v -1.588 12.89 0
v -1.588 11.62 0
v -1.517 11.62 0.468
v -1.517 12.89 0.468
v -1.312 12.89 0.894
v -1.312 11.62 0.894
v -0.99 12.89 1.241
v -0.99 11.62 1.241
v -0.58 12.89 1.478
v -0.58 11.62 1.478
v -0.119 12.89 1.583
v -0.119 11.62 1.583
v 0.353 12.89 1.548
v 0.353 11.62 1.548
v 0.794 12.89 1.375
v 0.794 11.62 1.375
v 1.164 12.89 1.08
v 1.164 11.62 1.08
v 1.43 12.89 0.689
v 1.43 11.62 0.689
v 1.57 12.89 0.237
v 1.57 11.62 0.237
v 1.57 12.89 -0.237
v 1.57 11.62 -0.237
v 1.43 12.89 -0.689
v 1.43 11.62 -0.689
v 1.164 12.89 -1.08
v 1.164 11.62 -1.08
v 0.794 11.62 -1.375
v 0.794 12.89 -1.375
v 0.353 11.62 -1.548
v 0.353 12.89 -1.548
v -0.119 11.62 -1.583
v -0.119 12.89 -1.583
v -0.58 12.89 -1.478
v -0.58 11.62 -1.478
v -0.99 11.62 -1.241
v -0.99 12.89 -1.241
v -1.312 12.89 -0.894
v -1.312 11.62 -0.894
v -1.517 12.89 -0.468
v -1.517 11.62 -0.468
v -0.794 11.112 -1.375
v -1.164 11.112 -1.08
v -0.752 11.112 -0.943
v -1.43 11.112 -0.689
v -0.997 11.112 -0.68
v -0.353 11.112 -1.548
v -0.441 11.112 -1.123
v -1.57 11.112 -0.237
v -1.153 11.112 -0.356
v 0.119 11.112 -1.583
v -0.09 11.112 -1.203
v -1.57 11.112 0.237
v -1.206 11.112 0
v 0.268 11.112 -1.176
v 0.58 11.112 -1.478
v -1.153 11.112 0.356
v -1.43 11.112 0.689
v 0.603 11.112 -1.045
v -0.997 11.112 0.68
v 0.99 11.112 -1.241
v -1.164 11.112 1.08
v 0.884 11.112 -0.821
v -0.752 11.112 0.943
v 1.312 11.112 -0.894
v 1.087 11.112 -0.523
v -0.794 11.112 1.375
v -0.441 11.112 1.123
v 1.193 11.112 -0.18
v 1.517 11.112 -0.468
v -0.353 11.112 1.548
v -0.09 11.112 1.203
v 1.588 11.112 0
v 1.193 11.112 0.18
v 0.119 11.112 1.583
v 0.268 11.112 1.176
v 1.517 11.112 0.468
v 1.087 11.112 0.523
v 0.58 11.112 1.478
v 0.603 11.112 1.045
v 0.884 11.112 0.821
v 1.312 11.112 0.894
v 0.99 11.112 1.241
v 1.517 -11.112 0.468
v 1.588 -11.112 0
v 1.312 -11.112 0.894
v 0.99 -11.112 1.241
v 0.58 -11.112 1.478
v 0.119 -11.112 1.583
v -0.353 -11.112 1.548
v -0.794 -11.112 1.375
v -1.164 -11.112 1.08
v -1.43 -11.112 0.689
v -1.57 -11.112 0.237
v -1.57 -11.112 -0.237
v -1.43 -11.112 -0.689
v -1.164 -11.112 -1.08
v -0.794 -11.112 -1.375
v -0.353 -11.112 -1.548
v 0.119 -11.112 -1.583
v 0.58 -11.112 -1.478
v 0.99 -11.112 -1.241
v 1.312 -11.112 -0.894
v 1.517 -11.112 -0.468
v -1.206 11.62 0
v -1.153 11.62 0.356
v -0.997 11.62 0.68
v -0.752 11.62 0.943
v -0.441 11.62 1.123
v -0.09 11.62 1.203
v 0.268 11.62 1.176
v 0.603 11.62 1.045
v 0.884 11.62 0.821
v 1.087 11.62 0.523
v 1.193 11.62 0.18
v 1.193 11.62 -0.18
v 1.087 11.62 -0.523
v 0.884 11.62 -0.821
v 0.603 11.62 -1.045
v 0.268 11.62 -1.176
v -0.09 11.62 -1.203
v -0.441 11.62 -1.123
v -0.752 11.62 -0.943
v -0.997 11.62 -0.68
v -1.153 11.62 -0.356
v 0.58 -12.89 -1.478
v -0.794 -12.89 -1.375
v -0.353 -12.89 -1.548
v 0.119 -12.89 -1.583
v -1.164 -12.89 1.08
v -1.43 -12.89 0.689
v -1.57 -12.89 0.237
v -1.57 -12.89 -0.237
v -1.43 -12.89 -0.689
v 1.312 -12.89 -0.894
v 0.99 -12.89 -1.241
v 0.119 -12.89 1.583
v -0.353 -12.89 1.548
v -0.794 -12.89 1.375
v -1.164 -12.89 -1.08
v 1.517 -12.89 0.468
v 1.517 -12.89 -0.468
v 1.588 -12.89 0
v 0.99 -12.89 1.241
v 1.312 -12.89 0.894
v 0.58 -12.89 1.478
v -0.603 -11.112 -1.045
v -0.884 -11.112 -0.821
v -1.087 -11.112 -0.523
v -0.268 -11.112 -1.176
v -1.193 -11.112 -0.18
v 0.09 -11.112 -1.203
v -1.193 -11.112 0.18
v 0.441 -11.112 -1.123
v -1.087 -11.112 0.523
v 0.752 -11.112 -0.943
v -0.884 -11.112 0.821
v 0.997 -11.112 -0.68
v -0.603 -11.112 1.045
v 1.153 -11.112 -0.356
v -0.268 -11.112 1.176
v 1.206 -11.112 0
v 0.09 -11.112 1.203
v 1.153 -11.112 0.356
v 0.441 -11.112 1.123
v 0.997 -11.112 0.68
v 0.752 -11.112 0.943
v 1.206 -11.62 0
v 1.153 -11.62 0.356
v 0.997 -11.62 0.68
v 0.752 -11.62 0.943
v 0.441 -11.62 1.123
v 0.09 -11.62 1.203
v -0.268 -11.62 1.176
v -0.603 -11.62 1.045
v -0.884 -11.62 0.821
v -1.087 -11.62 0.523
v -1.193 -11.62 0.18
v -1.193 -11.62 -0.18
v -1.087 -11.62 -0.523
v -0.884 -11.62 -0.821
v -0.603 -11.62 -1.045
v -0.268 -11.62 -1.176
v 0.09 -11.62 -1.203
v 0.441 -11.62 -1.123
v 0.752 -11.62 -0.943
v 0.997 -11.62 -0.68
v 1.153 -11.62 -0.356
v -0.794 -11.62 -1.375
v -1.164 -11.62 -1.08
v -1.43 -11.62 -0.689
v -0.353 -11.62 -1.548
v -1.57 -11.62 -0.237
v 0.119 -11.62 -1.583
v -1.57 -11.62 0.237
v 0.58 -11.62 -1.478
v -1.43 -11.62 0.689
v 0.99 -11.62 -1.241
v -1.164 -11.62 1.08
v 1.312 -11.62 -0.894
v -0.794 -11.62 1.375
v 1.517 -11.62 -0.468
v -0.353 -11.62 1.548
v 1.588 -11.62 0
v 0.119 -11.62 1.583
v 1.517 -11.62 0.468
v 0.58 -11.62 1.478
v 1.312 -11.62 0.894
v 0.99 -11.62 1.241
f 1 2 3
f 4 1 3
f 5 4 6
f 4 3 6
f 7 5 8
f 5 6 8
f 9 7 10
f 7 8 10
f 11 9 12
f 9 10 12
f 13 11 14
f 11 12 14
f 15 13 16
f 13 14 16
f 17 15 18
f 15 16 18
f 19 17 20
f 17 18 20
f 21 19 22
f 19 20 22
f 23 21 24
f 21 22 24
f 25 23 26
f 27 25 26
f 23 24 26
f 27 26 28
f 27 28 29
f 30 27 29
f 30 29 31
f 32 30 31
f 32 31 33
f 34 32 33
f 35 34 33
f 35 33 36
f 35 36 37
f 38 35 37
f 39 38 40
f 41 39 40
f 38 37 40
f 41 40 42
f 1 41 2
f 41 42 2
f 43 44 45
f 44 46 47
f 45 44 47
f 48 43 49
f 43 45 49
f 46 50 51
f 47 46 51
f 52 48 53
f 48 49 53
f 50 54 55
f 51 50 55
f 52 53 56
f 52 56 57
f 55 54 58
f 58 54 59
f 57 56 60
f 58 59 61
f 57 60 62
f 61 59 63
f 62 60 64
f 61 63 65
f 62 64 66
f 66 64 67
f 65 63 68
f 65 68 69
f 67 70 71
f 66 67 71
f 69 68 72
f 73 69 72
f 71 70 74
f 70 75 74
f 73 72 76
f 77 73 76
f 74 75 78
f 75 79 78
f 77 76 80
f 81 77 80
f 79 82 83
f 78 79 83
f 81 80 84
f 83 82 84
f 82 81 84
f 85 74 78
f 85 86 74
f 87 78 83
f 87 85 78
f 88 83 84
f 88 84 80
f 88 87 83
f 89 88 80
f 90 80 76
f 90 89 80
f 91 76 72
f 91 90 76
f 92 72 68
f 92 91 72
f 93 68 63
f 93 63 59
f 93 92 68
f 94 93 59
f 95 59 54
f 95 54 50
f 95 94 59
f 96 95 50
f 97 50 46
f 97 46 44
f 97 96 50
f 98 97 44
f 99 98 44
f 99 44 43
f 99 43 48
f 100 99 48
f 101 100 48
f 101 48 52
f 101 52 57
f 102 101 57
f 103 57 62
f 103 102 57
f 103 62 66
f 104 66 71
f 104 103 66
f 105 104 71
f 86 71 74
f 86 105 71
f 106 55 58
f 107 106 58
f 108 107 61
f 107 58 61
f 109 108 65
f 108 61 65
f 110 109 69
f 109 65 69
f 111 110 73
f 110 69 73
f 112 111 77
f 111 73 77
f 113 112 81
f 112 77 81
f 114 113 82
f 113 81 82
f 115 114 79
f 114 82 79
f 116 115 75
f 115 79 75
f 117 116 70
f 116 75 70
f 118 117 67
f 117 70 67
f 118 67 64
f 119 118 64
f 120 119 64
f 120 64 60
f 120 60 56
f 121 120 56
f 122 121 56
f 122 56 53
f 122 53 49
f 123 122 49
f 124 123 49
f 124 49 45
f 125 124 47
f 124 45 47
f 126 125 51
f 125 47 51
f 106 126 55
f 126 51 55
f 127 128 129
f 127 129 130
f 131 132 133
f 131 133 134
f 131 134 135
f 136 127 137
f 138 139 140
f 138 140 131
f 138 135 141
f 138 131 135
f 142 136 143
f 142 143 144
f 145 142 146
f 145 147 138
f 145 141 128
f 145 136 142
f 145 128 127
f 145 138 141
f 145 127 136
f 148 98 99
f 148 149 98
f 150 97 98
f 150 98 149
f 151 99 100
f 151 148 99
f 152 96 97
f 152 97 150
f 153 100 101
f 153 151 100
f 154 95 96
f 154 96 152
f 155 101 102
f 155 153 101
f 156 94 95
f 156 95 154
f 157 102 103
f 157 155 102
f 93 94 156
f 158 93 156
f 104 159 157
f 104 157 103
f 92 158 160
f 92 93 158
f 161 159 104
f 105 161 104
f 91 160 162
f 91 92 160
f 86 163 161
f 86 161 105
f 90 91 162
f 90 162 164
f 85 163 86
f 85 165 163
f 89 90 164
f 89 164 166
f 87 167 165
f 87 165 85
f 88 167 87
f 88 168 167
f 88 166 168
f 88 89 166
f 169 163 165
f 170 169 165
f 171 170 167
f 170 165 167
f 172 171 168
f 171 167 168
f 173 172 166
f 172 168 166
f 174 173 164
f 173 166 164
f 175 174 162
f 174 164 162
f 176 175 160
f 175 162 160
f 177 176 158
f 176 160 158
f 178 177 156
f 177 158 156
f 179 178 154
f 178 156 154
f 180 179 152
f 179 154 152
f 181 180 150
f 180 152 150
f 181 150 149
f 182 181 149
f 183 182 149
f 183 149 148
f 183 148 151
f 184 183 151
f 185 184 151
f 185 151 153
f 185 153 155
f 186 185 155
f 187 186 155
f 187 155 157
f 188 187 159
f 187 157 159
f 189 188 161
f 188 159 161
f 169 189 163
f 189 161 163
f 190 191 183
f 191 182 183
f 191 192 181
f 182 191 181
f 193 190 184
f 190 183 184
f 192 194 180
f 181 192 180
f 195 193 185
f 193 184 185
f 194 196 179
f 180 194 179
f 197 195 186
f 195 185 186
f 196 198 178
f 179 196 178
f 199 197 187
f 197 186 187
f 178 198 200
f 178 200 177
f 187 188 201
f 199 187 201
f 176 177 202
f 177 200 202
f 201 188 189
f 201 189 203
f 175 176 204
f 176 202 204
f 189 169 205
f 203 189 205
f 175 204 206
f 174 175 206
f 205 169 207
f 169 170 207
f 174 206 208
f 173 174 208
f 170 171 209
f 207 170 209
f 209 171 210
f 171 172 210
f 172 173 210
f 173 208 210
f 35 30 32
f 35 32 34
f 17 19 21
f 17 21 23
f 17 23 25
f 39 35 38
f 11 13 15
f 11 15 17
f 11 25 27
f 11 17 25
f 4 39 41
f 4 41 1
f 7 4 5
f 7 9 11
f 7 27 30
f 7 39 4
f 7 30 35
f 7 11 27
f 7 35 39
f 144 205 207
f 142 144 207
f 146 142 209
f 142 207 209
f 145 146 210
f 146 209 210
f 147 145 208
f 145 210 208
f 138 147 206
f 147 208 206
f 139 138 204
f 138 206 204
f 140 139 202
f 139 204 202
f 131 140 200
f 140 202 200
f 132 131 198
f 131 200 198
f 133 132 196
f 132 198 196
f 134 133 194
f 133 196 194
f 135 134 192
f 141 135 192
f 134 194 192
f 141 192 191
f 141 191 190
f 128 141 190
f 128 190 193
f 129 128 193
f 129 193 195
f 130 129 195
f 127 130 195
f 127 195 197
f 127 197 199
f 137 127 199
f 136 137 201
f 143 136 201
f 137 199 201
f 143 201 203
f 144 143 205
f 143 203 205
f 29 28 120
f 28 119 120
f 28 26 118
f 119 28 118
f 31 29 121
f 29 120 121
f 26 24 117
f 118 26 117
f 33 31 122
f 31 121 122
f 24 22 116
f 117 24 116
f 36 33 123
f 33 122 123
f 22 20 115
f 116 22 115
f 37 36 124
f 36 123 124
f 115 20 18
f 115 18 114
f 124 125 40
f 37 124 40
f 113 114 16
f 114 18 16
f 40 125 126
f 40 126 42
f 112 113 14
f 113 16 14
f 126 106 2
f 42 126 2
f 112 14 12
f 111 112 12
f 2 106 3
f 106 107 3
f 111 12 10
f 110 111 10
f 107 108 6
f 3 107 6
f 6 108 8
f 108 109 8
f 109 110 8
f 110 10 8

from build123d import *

# Parameters (mm, degrees)
F0_R     = 1.5875
F1_DEPTH = 11.1125
F2_R     = 1.2065
F3_DEPTH = 0.508
F4_R     = 1.5875
F4_R_2   = 1.2065
F5_DEPTH = 1.27
F6_R     = 1.2065
F7_DEPTH = 0.508
F8_R     = 1.5875
F8_R_2   = 1.2065
F9_DEPTH = 1.27


with BuildPart() as f1:
    # F0 (on Front) → F1 (new body, symmetric)
    with BuildSketch(Plane.XZ):
        Circle(F0_R)
    extrude(amount=F1_DEPTH, both=True)

    # F2 (on face) → F3 (join)
    with BuildSketch(Plane.XZ.offset(11.1125)):
        Circle(F2_R)
    extrude(amount=F3_DEPTH)

    # F4 (on face) → F5 (join)
    with BuildSketch(Plane.XZ.offset(11.6205)):
        Circle(F4_R)
        Circle(F4_R_2, mode=Mode.SUBTRACT)
        Circle(F4_R_2)
    extrude(amount=F5_DEPTH)

    # F6 (on face) → F7 (join)
    with BuildSketch(Plane(origin=(0, 11.1125, 0), x_dir=(-1, 0, 0), z_dir=(0, 1, 0))):
        Circle(F6_R)
    extrude(amount=F7_DEPTH)

    # F8 (on face) → F9 (join)
    with BuildSketch(Plane(origin=(0, 11.6205, 0), x_dir=(-1, 0, 0), z_dir=(0, 1, 0))):
        Circle(F8_R)
        Circle(F8_R_2, mode=Mode.SUBTRACT)
        Circle(F8_R_2)
    extrude(amount=F9_DEPTH)


solid = f1.part
